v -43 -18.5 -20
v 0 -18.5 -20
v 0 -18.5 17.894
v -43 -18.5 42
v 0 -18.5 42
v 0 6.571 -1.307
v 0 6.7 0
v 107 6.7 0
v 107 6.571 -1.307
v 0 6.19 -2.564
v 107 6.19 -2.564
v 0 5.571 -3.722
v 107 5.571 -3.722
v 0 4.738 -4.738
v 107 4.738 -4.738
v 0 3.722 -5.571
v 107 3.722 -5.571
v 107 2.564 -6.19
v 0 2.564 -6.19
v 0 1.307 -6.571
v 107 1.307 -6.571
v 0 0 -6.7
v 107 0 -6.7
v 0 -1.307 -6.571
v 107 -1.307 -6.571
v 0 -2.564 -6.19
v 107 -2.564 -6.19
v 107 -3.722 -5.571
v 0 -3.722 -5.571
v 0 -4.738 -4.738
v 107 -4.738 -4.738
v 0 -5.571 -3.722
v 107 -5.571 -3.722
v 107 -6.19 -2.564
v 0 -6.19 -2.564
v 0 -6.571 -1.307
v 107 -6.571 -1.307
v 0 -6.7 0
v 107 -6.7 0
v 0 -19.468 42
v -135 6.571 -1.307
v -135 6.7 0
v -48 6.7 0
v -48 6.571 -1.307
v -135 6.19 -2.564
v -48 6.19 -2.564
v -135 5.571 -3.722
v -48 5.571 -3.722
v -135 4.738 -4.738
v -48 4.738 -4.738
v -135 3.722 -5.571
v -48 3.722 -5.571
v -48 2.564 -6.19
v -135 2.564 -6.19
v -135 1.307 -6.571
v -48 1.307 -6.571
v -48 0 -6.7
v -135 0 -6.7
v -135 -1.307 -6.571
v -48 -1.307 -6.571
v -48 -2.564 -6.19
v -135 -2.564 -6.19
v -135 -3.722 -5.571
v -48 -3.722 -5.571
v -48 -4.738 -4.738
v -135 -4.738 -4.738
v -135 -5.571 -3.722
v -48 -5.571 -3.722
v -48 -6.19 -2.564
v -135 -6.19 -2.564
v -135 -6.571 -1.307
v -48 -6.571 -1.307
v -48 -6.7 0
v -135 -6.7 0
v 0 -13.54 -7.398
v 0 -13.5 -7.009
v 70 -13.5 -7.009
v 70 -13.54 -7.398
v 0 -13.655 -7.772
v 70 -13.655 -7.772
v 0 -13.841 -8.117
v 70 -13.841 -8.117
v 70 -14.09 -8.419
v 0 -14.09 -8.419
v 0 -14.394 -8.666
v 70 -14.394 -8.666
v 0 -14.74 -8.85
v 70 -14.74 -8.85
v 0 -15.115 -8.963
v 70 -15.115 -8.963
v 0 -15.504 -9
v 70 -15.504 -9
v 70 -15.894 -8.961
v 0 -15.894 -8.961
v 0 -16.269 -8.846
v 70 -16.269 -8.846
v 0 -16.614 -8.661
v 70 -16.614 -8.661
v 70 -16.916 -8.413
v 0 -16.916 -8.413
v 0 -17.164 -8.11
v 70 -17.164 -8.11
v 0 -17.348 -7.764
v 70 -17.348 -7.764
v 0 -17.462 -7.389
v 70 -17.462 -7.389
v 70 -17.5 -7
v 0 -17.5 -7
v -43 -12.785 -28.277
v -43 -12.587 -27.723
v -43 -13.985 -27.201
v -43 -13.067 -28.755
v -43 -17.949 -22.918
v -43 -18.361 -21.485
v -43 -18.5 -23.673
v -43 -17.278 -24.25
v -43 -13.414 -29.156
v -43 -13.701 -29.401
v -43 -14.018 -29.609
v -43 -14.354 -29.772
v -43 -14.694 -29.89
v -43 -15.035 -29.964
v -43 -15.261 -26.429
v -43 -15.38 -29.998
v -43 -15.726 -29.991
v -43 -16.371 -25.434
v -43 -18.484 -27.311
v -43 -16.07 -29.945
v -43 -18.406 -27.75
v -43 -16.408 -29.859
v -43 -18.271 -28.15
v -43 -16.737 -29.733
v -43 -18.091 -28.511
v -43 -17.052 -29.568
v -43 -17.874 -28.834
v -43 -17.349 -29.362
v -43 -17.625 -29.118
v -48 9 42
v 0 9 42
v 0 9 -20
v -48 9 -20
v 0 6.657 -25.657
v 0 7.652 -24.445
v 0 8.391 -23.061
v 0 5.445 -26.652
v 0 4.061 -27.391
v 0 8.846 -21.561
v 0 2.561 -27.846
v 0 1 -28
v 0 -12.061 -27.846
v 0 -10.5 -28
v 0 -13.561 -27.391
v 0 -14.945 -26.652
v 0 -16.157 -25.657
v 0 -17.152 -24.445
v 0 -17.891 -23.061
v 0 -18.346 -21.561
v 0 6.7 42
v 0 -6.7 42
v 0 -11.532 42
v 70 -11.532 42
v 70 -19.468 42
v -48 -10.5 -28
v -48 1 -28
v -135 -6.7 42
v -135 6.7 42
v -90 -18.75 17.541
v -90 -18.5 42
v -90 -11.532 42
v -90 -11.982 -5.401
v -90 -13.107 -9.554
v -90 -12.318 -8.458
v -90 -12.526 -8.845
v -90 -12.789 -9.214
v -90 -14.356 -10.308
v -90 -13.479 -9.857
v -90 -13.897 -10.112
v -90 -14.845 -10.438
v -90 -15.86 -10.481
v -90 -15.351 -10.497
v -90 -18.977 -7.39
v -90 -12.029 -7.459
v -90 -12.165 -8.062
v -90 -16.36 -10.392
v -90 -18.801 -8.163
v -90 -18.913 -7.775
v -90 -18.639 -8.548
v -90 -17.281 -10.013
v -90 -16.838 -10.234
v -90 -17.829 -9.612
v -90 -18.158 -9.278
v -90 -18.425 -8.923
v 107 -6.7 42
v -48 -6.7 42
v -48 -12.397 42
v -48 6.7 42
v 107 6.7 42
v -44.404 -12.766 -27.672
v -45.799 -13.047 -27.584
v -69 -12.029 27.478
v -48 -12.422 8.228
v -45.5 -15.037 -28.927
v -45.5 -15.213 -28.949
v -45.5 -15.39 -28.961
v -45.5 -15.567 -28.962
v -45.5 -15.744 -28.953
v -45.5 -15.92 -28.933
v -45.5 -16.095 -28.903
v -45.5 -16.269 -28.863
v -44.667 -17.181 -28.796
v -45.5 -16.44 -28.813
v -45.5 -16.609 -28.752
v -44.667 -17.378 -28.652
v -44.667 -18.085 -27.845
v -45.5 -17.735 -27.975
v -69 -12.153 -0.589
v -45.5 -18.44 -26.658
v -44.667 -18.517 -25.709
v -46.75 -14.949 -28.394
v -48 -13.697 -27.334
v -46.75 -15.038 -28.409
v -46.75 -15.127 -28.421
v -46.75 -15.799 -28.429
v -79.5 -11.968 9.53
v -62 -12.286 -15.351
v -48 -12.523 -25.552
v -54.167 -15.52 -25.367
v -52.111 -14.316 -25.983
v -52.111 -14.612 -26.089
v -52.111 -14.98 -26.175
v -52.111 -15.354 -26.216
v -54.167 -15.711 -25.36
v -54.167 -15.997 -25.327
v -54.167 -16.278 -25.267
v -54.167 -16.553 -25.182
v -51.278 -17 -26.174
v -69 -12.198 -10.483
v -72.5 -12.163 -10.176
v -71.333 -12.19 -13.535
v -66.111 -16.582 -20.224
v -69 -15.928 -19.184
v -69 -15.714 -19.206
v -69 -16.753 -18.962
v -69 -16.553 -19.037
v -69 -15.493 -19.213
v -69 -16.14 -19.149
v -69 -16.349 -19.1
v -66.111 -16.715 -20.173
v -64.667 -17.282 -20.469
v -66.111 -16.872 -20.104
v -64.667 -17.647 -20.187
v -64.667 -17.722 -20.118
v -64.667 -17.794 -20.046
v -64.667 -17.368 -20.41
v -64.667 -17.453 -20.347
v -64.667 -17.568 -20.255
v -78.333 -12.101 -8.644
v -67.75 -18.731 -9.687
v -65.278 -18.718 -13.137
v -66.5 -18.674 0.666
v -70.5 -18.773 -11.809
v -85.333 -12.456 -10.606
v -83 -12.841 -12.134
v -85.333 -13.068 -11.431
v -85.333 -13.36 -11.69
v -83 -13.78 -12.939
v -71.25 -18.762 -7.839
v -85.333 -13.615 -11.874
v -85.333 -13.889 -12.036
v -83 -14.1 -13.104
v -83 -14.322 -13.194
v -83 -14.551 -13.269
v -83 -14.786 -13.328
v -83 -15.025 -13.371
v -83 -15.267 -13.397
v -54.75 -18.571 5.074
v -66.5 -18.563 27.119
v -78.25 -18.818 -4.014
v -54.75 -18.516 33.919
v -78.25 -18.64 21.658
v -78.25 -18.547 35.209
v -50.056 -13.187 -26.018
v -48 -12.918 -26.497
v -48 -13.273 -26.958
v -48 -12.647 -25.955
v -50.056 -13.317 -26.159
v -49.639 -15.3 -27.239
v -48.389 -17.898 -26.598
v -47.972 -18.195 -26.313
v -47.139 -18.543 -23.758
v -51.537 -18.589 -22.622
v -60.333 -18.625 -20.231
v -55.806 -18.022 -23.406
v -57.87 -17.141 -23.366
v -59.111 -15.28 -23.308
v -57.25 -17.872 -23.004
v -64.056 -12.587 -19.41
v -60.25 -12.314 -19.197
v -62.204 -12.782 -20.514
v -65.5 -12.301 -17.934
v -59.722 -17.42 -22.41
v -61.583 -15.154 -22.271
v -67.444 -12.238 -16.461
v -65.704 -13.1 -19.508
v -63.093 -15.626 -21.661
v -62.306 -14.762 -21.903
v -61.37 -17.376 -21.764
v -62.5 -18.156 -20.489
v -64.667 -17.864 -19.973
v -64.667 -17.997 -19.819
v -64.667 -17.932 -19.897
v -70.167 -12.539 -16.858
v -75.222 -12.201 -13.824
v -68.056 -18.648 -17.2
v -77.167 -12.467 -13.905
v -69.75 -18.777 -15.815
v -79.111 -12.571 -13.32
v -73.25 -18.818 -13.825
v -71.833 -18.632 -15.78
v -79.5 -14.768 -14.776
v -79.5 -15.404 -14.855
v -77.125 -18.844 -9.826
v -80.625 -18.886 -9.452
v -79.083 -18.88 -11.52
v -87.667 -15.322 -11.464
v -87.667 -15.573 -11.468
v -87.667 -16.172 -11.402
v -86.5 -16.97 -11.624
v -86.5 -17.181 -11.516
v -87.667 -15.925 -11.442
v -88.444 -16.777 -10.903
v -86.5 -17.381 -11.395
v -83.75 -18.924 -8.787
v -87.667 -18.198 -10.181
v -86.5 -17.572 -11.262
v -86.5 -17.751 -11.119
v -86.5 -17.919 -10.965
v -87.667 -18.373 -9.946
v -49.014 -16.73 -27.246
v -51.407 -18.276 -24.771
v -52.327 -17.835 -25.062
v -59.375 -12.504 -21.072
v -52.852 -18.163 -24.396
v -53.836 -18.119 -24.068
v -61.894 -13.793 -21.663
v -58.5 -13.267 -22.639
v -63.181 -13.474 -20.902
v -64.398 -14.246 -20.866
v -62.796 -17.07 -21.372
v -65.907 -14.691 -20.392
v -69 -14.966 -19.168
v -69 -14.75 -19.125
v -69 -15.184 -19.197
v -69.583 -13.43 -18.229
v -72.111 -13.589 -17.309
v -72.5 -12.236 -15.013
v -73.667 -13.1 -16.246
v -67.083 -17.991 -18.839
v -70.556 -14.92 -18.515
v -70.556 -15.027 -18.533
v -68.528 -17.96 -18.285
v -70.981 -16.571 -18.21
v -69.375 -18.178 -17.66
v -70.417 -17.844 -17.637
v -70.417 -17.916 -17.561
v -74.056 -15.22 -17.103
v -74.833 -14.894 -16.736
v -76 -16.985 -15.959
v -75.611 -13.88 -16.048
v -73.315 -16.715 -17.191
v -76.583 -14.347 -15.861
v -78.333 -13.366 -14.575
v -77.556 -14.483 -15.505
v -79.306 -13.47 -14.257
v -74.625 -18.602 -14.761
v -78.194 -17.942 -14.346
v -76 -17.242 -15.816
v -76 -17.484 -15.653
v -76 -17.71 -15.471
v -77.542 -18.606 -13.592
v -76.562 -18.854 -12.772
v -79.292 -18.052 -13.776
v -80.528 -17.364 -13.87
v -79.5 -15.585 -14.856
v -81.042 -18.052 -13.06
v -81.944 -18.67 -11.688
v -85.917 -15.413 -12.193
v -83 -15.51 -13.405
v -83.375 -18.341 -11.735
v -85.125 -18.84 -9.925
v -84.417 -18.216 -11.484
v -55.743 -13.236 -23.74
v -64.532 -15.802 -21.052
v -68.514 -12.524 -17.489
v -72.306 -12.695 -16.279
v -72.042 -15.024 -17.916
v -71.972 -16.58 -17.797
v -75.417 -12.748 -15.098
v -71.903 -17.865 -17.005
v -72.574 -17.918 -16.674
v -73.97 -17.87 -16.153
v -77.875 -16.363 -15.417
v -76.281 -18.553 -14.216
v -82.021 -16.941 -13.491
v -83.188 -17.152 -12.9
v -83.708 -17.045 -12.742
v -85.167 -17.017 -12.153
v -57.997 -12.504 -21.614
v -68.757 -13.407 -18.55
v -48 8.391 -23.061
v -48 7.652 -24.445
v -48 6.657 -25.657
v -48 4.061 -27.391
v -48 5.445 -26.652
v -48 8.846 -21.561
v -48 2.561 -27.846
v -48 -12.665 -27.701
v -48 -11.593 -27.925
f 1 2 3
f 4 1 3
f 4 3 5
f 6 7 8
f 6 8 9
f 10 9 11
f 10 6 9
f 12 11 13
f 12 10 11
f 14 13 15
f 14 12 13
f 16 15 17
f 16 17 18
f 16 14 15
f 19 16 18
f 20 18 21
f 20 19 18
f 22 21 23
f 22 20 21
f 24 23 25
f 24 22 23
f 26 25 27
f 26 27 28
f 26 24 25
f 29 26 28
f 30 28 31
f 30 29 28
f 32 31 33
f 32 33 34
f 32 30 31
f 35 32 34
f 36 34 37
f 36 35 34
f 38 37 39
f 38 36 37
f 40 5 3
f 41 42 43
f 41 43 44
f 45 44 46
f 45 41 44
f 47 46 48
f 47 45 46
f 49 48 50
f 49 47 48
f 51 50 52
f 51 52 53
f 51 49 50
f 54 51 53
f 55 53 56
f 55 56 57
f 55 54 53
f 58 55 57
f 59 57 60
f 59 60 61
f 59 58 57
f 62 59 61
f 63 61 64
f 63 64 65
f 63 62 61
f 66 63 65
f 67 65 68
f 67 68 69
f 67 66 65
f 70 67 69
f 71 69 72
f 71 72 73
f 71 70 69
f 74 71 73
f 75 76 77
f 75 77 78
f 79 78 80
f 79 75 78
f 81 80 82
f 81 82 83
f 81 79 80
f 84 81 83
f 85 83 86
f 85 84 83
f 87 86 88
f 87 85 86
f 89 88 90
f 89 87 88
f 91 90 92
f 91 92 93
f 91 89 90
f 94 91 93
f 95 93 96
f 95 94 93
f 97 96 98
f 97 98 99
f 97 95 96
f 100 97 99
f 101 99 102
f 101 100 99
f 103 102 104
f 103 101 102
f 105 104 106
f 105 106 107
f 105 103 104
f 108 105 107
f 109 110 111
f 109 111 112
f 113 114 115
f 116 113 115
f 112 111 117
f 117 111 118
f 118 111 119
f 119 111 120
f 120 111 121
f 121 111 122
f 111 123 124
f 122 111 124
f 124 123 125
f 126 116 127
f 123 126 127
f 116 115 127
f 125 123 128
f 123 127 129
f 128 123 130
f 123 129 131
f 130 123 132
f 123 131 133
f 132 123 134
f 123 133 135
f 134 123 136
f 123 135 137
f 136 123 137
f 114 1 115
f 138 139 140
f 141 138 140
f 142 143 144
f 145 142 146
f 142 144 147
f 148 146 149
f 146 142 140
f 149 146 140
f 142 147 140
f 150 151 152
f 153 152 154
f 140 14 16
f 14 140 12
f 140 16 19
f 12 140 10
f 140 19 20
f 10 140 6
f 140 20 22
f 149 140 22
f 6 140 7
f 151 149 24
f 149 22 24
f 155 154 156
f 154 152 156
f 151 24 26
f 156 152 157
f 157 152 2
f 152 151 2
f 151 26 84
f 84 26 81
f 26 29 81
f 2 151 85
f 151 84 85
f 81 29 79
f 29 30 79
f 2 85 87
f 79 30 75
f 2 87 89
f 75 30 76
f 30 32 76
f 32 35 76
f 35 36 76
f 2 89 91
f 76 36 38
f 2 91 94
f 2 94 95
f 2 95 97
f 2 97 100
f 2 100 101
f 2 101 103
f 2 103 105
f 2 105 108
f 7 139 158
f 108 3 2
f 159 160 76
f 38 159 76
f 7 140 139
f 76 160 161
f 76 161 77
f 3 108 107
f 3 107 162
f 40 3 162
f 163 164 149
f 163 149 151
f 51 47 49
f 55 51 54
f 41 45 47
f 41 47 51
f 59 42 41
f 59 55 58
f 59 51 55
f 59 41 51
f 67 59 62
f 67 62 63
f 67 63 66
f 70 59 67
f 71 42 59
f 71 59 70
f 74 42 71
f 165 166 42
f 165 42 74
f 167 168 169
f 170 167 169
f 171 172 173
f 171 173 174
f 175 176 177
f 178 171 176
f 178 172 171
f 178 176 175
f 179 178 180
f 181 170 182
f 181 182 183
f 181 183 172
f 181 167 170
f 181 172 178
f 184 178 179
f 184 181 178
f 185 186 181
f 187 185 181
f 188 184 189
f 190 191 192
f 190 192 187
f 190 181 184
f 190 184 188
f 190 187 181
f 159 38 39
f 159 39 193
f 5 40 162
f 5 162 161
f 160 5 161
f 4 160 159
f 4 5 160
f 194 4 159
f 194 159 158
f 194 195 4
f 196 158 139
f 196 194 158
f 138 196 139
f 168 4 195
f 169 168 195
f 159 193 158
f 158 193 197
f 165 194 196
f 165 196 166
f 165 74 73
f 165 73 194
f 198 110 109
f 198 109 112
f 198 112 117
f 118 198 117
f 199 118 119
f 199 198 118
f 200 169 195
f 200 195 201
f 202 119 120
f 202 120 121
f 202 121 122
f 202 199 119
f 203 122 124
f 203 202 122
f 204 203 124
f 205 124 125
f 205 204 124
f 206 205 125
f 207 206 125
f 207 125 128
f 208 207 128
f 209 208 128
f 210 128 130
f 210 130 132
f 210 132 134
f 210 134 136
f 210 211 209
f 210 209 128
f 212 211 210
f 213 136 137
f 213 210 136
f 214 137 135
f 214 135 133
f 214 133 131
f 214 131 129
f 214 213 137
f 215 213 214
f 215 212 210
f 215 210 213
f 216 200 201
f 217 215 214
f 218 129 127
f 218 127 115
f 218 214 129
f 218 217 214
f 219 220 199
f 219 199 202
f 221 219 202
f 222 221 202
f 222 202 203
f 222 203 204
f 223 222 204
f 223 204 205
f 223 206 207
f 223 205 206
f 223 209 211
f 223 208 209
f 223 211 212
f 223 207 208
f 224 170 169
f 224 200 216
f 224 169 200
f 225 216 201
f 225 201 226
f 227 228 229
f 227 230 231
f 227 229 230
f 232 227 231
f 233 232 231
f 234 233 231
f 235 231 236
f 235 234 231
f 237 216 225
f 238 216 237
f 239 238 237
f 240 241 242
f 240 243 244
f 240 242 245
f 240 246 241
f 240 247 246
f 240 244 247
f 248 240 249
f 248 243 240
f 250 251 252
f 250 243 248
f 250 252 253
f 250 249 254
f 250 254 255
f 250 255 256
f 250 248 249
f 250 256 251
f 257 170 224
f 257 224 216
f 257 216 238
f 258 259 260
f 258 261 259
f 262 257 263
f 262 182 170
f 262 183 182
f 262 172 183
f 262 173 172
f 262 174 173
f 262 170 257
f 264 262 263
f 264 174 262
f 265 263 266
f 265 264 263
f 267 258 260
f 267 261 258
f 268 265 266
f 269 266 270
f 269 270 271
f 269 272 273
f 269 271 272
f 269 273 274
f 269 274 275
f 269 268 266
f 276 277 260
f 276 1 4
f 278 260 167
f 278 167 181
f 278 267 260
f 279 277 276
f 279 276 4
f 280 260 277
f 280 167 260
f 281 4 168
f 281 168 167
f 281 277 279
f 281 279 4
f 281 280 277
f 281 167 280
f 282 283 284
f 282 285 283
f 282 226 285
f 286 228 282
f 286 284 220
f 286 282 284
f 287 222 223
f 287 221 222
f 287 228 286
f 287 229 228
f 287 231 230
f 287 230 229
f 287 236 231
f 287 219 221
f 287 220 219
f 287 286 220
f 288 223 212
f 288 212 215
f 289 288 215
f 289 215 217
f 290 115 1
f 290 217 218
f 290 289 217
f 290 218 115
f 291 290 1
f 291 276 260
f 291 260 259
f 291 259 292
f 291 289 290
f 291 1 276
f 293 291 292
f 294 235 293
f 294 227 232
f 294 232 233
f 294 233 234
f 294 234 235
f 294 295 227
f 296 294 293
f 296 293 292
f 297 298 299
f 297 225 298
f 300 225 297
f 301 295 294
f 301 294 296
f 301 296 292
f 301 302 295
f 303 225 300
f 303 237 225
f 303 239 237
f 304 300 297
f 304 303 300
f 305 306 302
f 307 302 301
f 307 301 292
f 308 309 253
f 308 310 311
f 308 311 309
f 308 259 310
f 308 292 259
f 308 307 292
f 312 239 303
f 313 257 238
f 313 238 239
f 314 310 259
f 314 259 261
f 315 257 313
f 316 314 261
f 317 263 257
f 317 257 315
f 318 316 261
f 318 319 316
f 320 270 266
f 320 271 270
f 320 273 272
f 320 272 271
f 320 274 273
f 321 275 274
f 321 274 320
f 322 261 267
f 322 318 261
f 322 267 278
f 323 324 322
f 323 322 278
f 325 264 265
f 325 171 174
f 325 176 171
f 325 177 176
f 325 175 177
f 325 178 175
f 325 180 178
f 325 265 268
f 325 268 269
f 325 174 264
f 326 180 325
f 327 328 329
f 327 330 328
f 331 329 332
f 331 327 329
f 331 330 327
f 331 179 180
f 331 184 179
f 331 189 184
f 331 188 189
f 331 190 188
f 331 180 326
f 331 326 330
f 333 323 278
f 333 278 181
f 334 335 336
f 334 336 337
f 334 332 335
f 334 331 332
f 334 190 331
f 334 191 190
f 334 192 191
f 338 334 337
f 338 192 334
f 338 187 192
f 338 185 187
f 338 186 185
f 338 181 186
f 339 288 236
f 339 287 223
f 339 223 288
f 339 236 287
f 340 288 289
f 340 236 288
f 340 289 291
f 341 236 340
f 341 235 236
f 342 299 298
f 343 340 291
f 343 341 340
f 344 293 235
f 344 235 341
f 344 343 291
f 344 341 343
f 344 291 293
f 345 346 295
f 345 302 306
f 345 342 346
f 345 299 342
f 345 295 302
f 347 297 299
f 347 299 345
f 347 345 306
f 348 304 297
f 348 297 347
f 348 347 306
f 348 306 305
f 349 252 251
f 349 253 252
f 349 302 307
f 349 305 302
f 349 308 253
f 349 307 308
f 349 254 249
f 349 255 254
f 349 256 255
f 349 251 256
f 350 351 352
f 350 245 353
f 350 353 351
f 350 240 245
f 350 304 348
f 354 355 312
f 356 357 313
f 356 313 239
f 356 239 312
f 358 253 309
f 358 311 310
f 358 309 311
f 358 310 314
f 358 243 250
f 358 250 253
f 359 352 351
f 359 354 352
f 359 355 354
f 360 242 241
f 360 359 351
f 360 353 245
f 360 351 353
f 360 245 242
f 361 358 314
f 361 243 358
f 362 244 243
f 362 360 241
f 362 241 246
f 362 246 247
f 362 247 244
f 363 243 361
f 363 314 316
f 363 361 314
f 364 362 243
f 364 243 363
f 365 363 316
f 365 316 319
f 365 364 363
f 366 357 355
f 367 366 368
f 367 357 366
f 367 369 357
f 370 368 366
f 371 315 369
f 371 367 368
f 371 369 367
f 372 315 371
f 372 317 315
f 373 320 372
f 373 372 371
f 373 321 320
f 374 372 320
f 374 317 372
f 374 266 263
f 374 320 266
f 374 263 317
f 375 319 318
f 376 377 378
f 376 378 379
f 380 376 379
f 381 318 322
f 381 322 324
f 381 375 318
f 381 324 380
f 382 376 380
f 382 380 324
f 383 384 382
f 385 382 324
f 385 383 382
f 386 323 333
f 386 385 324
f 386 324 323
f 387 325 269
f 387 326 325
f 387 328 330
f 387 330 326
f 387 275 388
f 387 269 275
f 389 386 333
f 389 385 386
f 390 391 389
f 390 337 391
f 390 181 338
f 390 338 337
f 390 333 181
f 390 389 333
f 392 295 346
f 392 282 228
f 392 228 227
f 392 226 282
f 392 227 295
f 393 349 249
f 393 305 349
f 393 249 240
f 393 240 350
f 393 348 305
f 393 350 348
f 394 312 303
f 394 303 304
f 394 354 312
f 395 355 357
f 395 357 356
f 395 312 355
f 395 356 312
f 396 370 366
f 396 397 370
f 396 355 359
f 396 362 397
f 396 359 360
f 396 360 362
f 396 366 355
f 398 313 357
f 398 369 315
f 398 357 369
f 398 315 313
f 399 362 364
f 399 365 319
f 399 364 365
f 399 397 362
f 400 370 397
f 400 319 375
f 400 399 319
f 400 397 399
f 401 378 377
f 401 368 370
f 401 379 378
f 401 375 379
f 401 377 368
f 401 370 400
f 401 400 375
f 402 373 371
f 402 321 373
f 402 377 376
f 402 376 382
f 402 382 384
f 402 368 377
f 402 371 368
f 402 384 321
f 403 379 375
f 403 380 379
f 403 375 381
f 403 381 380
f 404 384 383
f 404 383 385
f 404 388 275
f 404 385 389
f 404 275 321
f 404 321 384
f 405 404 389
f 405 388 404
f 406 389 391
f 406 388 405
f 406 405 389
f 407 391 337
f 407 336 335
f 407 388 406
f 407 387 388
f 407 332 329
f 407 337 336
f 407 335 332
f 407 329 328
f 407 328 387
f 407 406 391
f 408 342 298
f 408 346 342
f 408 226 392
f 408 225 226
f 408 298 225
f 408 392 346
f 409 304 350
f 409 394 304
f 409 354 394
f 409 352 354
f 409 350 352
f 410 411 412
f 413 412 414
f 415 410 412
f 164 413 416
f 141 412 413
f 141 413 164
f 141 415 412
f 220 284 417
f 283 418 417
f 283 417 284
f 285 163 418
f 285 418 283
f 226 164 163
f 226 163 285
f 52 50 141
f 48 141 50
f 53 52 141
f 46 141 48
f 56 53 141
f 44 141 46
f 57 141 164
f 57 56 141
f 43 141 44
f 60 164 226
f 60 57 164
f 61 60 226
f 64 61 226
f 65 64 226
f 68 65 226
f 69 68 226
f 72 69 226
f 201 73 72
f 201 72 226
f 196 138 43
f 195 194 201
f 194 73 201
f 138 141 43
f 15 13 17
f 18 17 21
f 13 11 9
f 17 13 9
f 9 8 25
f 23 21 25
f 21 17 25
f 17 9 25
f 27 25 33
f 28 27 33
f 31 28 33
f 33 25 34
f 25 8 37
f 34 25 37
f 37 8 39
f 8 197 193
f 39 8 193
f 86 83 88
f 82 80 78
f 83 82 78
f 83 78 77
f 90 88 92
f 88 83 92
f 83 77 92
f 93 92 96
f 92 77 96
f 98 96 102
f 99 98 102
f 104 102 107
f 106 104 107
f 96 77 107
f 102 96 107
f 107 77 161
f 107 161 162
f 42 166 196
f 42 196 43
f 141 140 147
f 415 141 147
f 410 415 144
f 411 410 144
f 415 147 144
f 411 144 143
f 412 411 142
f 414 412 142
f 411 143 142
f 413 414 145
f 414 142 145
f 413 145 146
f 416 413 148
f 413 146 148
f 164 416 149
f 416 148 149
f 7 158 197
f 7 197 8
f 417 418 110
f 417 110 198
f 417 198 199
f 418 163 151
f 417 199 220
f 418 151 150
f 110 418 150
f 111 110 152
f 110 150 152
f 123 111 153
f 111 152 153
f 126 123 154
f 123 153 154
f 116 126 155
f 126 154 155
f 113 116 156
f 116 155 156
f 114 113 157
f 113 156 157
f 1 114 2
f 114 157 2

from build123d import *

# Parameters (mm, degrees)
BOSS_EXTRUDE1_DEPTH      = 48
BOSS_EXTRUDE2_DEPTH      = 107
BOSS_EXTRUDE2_DEPTH_BACK = 135
BOSS_EXTRUDE3_DEPTH      = 70


with BuildPart() as part:
    # Sketch6 → Boss-Extrude1 (new body)
    with BuildSketch(Plane.YZ):
        with BuildLine():
            Line((-18.5, 42), (9, 42))
            Line((9, 42), (9, -20))
            ThreePointArc((9, -20), (6.656854249, -25.656854249), (1, -28))
            Line((1, -28), (-10.5, -28))
            ThreePointArc((-10.5, -28), (-16.156854249, -25.656854249), (-18.5, -20))
            Line((-18.5, -20), (-18.5, 42))
        make_face()
    extrude(amount=-BOSS_EXTRUDE1_DEPTH)

    # Sketch7 → Boss-Extrude2 (add, two sides: drawn at the far end of the back side and taken through both)
    with BuildSketch(Plane.YZ.offset(-BOSS_EXTRUDE2_DEPTH_BACK)):
        with BuildLine():
            Line((6.7, 42), (6.7, 0))
            ThreePointArc((6.7, 0), (0, -6.7), (-6.7, 0))
            Line((-6.7, 0), (-6.7, 42))
            Line((-6.7, 42), (6.7, 42))
        make_face()
    extrude(amount=BOSS_EXTRUDE2_DEPTH + BOSS_EXTRUDE2_DEPTH_BACK)

    # Sketch8 → Boss-Extrude3 (add)
    with BuildSketch(Plane.YZ):
        with BuildLine():
            Line((-17.499999986, -6.99976205), (-19.468374717, 42))
            Line((-19.468374717, 42), (-11.531625283, 42))
            Line((-11.531625283, 42), (-13.500019034, -7.008725467))
            ThreePointArc((-13.500019034, -7.008725467), (-15.504481719, -8.999994979), (-17.499999986, -6.99976205))
        make_face()
    extrude(amount=BOSS_EXTRUDE3_DEPTH)

    # Loft2: read off the stored shape, not the designer's step
    # Loft2: loft between two sections, ruled curve by curve
    loft2_from = [
        Edge.make_bspline([(-43, -12.5, 42), (-43, -12.5, 36.250008881), (-43, -12.5, 24.641436529), (-43, -12.5, 7.145431099), (-43, -12.5, -10.177895331), (-43, -12.5, -21.457402798), (-43, -12.5, -27.496400477), (-43, -12.735353866, -28.366169962), (-43, -13.470979996, -29.306081404), (-43, -14.433479869, -29.873432167), (-43, -15.500002282, -30.063307511), (-43, -16.566524261, -29.873430596), (-43, -17.529022849, -29.306078761), (-43, -18.264647219, -28.36616736), (-43, -18.5, -27.496399176), (-43, -18.5, -21.457400197), (-43, -18.5, -10.177897954), (-43, -18.5, 7.145406937), (-43, -18.5, 24.641401673), (-43, -18.5, 36.249991119), (-43, -18.5, 42)], [0, 0, 0, 0, 0.114724944, 0.229449887, 0.344174831, 0.458899774, 0.458899774, 0.469174653, 0.479449533, 0.489724412, 0.499999291, 0.51027417, 0.52054905, 0.530823929, 0.541098808, 0.541098808, 0.655824106, 0.770549404, 0.885274702, 1, 1, 1, 1], 3),
        Edge.make_line((-43, -18.5, 42), (-43, -12.5, 42)),
    ]
    loft2_to = [
        Edge.make_bspline([(-90, -11.531625283, 42), (-90, -11.570656574, 37.916659954), (-90, -11.648004314, 29.824764413), (-90, -11.763499254, 17.742019914), (-90, -11.880008186, 5.553194479), (-90, -11.95947034, -2.759904881), (-90, -12, -7.379764452), (-90, -12.124025603, -8.182036975), (-90, -12.791211148, -9.362294599), (-90, -13.96862904, -10.268779081), (-90, -15.499994859, -10.616349391), (-90, -17.031362783, -10.268783245), (-90, -18.208784945, -9.362299724), (-90, -18.87597374, -8.182040057), (-90, -19, -7.379765435), (-90, -18.956733754, -2.759907847), (-90, -18.871906161, 5.553196207), (-90, -18.747530231, 17.742037363), (-90, -18.624236843, 29.824789377), (-90, -18.541666598, 37.916673379), (-90, -18.5, 42)], [0, 0, 0, 0, 0.114724944, 0.229449887, 0.344174831, 0.458899774, 0.458899774, 0.469174653, 0.479449533, 0.489724412, 0.499999291, 0.51027417, 0.52054905, 0.530823929, 0.541098808, 0.541098808, 0.655824106, 0.770549404, 0.885274702, 1, 1, 1, 1], 3),
        Edge.make_line((-90, -18.5, 42), (-90, -11.531625283, 42)),
    ]
    loft2 = Solid(Shell([*[Face.make_surface_from_curves(loft2_from[k], loft2_to[k]) for k in range(2)], Face(Wire(loft2_from)), Face(Wire(loft2_to))]))
    add(loft2)


solid = part.part
